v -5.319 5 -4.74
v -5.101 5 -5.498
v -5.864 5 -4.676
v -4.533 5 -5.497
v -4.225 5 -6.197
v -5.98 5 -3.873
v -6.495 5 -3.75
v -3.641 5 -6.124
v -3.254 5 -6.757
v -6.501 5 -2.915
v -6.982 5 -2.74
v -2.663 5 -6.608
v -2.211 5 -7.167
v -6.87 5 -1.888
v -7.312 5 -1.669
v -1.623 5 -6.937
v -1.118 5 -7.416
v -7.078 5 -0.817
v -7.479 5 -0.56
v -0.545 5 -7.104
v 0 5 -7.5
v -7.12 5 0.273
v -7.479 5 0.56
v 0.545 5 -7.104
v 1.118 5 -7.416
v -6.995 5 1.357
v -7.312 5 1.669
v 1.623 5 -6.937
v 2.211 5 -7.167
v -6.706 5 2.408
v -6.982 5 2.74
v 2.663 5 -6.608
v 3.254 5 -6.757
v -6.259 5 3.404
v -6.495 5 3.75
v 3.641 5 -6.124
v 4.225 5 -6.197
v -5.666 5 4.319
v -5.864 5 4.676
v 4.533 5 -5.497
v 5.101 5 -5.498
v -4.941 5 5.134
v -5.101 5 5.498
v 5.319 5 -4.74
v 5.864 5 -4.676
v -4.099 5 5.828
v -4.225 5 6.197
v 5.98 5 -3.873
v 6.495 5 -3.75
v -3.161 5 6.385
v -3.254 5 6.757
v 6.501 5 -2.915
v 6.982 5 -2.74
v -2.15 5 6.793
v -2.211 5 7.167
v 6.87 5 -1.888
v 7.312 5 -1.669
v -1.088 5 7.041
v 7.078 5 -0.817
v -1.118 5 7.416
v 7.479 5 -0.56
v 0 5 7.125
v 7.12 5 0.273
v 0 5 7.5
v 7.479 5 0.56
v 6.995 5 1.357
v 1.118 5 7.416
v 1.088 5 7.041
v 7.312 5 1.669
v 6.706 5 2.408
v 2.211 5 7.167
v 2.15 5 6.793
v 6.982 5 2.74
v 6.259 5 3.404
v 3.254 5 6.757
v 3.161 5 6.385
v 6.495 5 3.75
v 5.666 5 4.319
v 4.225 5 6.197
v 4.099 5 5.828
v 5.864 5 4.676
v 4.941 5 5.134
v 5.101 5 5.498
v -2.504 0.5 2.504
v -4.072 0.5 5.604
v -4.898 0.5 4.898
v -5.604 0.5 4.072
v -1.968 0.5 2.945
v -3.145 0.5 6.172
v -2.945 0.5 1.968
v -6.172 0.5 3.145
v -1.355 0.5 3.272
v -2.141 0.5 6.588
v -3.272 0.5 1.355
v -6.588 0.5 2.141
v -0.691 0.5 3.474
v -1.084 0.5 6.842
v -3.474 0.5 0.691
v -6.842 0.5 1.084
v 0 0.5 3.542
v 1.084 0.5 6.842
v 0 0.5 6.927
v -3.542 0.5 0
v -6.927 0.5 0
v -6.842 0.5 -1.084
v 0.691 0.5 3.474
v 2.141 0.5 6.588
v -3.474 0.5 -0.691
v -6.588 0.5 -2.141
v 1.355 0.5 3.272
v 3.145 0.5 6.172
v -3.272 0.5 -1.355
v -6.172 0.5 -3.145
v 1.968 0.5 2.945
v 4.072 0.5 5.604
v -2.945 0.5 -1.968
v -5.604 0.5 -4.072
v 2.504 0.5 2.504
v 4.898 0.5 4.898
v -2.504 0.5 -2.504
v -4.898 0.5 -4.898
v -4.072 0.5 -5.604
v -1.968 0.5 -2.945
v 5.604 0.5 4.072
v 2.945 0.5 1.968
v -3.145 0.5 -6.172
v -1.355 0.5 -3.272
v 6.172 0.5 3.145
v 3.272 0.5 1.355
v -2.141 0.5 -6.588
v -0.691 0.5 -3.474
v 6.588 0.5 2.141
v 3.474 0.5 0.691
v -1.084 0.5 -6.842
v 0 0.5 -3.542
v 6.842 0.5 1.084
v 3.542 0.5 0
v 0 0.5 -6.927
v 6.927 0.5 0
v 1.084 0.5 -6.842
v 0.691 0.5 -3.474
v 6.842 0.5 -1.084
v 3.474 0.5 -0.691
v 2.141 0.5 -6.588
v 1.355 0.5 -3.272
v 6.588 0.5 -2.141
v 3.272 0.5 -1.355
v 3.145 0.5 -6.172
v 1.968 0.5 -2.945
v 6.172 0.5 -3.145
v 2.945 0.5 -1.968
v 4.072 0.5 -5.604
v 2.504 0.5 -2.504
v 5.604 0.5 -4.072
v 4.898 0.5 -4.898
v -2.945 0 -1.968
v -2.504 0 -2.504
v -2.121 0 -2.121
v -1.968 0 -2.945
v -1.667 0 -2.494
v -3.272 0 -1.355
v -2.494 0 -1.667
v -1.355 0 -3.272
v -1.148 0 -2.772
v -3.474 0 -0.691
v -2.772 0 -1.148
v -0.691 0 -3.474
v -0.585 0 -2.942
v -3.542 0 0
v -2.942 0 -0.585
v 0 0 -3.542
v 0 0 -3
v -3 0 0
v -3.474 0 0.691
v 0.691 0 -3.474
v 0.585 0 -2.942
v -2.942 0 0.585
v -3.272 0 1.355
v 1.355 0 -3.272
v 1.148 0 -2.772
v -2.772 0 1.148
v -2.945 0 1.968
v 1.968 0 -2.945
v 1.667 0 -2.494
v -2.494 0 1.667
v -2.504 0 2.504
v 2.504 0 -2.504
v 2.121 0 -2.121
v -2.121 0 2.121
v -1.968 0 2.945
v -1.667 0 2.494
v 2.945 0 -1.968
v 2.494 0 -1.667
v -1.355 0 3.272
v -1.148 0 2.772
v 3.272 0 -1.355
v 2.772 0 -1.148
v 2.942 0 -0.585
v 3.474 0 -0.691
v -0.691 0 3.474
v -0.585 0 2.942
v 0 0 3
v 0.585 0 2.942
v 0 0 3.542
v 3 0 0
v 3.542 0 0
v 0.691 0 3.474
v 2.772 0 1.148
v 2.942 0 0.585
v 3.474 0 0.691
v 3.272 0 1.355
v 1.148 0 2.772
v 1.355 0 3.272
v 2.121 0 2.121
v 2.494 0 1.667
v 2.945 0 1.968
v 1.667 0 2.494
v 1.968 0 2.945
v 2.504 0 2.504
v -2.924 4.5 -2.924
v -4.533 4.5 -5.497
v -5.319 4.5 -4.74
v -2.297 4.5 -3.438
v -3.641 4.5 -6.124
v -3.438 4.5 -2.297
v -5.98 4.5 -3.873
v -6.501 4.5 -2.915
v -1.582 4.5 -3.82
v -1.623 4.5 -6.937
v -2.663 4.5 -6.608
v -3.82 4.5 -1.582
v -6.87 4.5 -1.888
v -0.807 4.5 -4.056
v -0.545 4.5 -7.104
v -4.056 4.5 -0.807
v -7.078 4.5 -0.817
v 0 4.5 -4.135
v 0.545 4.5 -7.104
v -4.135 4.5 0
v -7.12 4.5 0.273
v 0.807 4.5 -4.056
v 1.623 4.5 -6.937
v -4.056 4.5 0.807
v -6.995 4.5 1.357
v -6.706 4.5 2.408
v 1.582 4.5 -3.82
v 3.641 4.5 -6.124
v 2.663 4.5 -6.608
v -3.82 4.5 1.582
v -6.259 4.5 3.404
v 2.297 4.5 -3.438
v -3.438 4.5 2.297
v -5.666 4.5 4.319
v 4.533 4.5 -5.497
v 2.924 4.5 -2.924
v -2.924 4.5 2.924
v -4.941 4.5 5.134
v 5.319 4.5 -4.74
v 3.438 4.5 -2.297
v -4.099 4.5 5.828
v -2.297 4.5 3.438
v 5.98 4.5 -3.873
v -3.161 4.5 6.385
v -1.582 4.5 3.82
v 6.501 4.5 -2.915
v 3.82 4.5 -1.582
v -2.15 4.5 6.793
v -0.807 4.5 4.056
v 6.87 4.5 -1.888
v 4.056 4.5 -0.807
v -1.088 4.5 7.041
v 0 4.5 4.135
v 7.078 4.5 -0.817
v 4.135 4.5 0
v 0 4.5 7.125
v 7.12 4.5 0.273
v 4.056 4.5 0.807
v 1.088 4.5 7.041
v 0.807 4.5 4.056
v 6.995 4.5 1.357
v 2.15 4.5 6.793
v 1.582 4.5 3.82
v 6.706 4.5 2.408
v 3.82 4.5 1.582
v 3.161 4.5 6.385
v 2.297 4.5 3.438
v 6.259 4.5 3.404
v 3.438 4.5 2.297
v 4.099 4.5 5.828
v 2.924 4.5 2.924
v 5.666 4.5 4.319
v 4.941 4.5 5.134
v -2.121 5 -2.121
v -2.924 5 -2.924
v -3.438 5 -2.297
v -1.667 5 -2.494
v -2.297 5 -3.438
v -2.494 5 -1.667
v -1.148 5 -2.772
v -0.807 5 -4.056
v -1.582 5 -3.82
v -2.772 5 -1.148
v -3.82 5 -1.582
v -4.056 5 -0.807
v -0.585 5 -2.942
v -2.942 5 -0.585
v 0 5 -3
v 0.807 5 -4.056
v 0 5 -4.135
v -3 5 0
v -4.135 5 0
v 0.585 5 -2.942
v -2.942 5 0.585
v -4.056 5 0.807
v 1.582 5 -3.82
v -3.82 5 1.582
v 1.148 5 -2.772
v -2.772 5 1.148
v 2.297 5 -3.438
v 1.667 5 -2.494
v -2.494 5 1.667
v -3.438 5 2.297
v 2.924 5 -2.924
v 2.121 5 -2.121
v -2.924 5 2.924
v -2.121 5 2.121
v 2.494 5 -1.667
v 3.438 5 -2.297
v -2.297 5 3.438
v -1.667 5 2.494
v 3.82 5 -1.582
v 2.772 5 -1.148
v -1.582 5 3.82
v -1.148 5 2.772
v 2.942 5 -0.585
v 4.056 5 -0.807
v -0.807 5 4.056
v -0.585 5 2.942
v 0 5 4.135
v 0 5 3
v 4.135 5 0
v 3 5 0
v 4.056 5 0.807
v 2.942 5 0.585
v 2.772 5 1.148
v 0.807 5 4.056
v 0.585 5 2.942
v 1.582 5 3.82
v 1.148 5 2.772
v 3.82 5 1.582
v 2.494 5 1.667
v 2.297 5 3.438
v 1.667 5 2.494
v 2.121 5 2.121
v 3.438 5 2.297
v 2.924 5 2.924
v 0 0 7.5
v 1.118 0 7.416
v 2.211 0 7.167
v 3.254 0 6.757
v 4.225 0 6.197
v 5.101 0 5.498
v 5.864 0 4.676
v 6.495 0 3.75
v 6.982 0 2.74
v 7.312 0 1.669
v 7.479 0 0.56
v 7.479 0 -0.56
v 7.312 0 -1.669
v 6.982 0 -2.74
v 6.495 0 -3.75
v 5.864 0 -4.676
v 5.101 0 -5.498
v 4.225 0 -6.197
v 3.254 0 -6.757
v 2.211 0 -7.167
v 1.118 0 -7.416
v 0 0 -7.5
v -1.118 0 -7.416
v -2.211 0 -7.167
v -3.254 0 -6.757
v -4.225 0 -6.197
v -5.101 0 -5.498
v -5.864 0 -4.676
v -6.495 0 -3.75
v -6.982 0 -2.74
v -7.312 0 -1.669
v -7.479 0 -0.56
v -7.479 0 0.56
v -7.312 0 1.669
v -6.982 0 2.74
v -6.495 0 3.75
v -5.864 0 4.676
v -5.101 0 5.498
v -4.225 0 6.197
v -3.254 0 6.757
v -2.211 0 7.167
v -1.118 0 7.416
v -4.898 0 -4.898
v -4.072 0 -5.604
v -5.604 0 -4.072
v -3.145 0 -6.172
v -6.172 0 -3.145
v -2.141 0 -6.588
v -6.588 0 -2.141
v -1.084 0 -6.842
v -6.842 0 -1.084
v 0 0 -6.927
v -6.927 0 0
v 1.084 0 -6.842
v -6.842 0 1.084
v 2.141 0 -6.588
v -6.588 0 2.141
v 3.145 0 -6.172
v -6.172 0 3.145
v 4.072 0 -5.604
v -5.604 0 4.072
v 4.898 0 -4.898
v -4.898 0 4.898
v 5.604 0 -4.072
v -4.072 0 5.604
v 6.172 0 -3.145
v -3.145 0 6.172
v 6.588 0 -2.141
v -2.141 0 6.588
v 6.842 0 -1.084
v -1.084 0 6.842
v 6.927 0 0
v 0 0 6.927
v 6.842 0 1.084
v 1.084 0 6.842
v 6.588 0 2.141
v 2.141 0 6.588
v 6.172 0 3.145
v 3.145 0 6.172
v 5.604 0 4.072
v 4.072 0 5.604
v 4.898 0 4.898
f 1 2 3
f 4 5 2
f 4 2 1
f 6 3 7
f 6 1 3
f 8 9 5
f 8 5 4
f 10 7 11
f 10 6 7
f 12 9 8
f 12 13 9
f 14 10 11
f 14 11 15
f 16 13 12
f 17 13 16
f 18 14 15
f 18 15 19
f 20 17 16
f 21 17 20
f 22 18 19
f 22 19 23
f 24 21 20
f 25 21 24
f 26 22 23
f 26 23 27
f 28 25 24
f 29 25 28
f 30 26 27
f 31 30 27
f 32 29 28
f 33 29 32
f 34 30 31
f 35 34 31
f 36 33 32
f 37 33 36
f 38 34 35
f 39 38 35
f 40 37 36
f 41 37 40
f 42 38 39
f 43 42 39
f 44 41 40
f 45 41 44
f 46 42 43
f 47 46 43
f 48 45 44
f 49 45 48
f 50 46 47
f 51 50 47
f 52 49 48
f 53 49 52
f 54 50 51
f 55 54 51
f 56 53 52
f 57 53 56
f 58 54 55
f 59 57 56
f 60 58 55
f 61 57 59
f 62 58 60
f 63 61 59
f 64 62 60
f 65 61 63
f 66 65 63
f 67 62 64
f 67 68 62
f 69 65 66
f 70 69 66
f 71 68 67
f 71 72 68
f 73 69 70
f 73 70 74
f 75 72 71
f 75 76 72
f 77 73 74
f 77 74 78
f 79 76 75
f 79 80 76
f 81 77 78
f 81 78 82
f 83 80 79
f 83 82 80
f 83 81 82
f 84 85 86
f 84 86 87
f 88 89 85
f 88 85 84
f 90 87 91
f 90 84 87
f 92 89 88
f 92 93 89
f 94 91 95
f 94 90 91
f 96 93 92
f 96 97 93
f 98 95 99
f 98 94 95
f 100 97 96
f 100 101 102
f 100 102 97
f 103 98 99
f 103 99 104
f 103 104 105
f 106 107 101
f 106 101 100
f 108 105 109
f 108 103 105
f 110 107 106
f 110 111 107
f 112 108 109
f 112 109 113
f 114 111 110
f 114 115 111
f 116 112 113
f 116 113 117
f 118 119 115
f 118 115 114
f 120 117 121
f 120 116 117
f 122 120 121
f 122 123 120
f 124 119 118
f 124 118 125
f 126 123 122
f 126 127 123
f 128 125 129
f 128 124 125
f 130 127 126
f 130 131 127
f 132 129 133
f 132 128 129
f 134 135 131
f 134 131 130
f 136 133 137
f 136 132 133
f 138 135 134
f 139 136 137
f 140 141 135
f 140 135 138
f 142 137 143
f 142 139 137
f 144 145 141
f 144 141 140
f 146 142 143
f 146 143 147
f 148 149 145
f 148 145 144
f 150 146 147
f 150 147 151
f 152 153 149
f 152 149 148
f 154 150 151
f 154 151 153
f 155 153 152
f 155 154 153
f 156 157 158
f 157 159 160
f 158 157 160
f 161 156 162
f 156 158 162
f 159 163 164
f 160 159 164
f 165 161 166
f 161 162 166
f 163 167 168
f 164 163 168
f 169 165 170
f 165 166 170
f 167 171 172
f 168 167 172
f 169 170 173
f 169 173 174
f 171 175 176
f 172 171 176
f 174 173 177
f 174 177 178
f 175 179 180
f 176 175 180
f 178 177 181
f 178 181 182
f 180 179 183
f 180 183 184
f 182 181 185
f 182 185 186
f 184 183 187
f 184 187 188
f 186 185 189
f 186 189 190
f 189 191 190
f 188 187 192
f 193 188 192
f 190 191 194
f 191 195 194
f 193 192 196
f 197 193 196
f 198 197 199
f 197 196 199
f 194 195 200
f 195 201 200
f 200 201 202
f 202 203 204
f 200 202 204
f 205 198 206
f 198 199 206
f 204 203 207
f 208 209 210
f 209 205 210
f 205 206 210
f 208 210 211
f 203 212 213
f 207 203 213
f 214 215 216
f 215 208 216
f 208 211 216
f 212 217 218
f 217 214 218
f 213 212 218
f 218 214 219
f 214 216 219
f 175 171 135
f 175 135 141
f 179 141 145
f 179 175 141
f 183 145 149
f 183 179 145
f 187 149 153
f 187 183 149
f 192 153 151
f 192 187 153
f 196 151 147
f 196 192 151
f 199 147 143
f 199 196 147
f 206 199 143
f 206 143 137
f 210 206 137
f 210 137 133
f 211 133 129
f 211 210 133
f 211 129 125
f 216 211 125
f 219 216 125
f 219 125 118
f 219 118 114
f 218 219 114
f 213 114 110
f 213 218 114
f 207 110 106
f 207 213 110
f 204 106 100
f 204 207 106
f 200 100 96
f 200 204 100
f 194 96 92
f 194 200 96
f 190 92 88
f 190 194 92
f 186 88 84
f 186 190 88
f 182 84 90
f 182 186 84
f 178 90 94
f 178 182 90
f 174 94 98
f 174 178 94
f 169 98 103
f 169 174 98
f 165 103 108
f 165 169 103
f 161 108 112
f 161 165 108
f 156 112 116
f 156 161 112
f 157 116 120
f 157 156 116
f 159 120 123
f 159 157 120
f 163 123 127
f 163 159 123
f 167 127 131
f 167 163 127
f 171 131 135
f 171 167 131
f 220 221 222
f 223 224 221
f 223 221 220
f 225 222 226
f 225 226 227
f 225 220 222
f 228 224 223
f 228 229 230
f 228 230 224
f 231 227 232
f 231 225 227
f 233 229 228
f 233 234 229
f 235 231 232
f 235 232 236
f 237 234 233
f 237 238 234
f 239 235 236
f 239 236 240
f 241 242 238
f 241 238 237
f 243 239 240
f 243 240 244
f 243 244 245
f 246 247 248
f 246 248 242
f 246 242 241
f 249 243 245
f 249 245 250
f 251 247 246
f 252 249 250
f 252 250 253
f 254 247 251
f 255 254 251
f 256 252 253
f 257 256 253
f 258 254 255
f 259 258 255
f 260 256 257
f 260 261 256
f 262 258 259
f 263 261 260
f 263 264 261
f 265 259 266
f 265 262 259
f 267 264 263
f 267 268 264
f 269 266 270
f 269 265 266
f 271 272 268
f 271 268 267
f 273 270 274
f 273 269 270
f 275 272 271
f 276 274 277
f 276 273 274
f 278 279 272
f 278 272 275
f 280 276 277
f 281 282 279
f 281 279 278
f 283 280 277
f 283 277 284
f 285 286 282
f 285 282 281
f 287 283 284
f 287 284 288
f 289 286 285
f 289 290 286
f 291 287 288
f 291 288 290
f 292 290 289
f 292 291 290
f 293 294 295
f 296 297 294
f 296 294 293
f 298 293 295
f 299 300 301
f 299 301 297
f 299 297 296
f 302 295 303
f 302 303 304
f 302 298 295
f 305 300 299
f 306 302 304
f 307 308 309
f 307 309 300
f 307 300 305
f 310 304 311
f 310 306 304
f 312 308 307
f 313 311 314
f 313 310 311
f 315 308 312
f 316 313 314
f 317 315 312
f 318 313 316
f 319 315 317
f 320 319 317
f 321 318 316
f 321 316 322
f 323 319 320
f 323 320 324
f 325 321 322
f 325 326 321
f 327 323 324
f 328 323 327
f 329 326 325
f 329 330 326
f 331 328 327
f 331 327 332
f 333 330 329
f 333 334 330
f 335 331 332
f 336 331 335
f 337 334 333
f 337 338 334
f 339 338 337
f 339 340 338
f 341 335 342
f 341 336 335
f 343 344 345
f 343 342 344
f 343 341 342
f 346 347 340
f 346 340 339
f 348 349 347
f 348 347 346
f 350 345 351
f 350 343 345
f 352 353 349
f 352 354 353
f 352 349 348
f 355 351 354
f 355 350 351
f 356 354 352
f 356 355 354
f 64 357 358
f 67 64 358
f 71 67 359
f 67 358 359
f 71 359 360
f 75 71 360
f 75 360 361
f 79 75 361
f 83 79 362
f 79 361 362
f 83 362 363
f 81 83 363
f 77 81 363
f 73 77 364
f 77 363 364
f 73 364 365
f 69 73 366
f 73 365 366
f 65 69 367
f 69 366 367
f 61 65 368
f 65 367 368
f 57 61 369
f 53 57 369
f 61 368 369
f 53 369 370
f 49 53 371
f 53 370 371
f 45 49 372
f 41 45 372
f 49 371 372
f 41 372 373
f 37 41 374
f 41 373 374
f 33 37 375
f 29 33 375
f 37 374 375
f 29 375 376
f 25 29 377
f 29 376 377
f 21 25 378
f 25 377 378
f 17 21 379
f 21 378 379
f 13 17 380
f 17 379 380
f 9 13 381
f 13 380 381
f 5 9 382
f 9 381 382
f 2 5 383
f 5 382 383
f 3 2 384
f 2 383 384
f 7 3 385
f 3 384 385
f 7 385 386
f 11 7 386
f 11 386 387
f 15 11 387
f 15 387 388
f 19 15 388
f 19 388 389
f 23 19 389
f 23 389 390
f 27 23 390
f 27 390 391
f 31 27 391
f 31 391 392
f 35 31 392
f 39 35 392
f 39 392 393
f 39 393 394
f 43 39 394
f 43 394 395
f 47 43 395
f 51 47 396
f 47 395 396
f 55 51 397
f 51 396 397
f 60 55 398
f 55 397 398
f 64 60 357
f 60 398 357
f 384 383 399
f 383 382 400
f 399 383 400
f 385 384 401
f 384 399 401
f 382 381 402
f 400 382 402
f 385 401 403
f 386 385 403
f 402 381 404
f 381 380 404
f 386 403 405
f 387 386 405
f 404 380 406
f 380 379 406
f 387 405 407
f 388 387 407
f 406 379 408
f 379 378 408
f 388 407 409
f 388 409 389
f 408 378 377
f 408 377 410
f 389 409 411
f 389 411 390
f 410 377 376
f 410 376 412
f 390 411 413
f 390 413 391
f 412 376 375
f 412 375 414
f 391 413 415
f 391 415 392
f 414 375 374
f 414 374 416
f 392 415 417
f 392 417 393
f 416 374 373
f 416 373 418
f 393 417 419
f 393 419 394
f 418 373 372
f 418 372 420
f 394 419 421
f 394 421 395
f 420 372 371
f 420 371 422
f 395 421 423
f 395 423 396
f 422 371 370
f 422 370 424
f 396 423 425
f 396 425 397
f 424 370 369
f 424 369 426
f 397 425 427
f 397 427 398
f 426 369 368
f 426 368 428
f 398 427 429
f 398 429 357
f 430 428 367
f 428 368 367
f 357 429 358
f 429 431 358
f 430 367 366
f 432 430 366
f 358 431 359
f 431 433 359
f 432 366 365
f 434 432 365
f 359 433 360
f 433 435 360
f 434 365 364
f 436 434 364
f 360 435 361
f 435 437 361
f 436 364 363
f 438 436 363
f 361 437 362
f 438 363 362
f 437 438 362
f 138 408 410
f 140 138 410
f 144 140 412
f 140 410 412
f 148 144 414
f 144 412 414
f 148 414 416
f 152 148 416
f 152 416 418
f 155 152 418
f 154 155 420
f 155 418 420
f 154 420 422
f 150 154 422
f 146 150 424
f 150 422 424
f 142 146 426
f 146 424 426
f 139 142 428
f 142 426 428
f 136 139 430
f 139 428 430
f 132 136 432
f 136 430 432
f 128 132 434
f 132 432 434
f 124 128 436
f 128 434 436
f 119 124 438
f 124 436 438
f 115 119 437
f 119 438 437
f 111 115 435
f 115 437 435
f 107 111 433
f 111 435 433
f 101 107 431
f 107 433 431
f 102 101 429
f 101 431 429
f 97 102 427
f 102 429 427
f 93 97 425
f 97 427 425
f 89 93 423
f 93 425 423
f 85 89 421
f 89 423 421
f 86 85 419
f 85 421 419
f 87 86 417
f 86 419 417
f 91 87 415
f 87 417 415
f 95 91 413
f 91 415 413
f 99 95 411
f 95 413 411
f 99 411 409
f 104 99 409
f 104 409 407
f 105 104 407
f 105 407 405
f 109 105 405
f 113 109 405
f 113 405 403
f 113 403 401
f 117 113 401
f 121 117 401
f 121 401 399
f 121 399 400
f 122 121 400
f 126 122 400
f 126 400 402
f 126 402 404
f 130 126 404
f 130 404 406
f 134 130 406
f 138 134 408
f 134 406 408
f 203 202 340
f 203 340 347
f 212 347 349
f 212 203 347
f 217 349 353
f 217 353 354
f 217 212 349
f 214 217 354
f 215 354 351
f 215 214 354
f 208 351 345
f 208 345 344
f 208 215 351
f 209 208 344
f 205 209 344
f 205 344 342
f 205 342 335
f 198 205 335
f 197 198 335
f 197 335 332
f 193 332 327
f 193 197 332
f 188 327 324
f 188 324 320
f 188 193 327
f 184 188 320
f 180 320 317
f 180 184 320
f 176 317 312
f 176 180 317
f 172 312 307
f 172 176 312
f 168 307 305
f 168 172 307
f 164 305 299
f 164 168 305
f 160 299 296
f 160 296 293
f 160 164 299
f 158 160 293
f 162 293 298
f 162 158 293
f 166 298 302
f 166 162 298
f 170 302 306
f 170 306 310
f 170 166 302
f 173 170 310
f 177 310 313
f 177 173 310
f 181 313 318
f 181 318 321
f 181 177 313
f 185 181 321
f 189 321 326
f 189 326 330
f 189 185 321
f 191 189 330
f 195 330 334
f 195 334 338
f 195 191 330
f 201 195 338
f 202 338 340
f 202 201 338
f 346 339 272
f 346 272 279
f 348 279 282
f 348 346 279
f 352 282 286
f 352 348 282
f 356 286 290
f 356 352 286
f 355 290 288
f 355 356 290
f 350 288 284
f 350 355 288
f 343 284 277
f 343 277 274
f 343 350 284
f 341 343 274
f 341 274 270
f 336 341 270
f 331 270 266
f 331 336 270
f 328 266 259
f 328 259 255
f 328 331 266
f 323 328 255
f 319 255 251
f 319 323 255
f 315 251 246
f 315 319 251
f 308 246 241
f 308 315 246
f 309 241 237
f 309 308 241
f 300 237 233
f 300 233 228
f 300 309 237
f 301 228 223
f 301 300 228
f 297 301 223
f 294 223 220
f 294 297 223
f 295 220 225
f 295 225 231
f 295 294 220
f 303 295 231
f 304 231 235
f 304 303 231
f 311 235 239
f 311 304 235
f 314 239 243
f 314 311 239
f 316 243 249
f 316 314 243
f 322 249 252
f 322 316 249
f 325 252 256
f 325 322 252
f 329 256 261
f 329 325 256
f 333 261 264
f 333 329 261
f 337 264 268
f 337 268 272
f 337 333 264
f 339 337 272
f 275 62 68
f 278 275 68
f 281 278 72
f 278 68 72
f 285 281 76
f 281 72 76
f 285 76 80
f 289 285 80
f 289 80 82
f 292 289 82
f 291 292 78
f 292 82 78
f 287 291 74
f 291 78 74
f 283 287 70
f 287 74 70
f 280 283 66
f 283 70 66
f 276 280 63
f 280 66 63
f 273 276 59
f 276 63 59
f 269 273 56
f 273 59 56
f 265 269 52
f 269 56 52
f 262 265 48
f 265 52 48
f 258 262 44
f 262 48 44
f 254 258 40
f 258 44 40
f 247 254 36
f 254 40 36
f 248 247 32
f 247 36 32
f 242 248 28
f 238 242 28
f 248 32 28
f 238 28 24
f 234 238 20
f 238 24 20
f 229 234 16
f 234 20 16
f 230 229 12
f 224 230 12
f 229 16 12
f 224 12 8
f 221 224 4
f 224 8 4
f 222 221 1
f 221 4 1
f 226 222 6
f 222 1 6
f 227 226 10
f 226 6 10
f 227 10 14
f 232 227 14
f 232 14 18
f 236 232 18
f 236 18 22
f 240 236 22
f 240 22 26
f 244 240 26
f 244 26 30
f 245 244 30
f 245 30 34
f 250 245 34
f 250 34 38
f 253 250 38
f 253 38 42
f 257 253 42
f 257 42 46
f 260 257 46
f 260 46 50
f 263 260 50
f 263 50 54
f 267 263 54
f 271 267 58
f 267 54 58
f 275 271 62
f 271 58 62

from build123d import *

# Parameters (mm, degrees)
CROQUIS1_R              = 7.5
CROQUIS1_R_2            = 3
SALIENTE_EXTRUIR1_DEPTH = 5
CROQUIS2_R              = 7.124900464
CROQUIS2_R_2            = 4.13518393
CORTAR_EXTRUIR1_DEPTH   = 0.5
CROQUIS3_R              = 6.927022016
CROQUIS3_R_2            = 3.541649153
CORTAR_EXTRUIR2_DEPTH   = 0.5


with BuildPart() as part:
    # Croquis1 → Saliente-Extruir1 (new body)
    with BuildSketch(Plane(origin=(0, 0, 0), x_dir=(1, 0, 0), z_dir=(0, 1, 0))):
        with Locations(Location((0, 0, 0), (0, 0, 270))):
            Circle(CROQUIS1_R)
        with Locations(Location((0, 0, 0), (0, 0, 270))):
            Circle(CROQUIS1_R_2, mode=Mode.SUBTRACT)
    extrude(amount=SALIENTE_EXTRUIR1_DEPTH)

    # Croquis2 → Cortar-Extruir1 (cut)
    with BuildSketch(Plane(origin=(0, 5, 0), x_dir=(1, 0, 0), z_dir=(0, 1, 0))):
        with Locations(Location((0, 0, 0), (0, 0, 270))):
            Circle(CROQUIS2_R)
        with Locations(Location((0, 0, 0), (0, 0, 270))):
            Circle(CROQUIS2_R_2, mode=Mode.SUBTRACT)
    extrude(amount=-CORTAR_EXTRUIR1_DEPTH, mode=Mode.SUBTRACT)

    # Croquis3 → Cortar-Extruir2 (cut)
    with BuildSketch(Plane.XZ):
        with Locations(Location((0, 0, 0), (0, 0, 270))):
            Circle(CROQUIS3_R)
        with Locations(Location((0, 0, 0), (0, 0, 270))):
            Circle(CROQUIS3_R_2, mode=Mode.SUBTRACT)
    extrude(amount=-CORTAR_EXTRUIR2_DEPTH, mode=Mode.SUBTRACT)


solid = part.part
